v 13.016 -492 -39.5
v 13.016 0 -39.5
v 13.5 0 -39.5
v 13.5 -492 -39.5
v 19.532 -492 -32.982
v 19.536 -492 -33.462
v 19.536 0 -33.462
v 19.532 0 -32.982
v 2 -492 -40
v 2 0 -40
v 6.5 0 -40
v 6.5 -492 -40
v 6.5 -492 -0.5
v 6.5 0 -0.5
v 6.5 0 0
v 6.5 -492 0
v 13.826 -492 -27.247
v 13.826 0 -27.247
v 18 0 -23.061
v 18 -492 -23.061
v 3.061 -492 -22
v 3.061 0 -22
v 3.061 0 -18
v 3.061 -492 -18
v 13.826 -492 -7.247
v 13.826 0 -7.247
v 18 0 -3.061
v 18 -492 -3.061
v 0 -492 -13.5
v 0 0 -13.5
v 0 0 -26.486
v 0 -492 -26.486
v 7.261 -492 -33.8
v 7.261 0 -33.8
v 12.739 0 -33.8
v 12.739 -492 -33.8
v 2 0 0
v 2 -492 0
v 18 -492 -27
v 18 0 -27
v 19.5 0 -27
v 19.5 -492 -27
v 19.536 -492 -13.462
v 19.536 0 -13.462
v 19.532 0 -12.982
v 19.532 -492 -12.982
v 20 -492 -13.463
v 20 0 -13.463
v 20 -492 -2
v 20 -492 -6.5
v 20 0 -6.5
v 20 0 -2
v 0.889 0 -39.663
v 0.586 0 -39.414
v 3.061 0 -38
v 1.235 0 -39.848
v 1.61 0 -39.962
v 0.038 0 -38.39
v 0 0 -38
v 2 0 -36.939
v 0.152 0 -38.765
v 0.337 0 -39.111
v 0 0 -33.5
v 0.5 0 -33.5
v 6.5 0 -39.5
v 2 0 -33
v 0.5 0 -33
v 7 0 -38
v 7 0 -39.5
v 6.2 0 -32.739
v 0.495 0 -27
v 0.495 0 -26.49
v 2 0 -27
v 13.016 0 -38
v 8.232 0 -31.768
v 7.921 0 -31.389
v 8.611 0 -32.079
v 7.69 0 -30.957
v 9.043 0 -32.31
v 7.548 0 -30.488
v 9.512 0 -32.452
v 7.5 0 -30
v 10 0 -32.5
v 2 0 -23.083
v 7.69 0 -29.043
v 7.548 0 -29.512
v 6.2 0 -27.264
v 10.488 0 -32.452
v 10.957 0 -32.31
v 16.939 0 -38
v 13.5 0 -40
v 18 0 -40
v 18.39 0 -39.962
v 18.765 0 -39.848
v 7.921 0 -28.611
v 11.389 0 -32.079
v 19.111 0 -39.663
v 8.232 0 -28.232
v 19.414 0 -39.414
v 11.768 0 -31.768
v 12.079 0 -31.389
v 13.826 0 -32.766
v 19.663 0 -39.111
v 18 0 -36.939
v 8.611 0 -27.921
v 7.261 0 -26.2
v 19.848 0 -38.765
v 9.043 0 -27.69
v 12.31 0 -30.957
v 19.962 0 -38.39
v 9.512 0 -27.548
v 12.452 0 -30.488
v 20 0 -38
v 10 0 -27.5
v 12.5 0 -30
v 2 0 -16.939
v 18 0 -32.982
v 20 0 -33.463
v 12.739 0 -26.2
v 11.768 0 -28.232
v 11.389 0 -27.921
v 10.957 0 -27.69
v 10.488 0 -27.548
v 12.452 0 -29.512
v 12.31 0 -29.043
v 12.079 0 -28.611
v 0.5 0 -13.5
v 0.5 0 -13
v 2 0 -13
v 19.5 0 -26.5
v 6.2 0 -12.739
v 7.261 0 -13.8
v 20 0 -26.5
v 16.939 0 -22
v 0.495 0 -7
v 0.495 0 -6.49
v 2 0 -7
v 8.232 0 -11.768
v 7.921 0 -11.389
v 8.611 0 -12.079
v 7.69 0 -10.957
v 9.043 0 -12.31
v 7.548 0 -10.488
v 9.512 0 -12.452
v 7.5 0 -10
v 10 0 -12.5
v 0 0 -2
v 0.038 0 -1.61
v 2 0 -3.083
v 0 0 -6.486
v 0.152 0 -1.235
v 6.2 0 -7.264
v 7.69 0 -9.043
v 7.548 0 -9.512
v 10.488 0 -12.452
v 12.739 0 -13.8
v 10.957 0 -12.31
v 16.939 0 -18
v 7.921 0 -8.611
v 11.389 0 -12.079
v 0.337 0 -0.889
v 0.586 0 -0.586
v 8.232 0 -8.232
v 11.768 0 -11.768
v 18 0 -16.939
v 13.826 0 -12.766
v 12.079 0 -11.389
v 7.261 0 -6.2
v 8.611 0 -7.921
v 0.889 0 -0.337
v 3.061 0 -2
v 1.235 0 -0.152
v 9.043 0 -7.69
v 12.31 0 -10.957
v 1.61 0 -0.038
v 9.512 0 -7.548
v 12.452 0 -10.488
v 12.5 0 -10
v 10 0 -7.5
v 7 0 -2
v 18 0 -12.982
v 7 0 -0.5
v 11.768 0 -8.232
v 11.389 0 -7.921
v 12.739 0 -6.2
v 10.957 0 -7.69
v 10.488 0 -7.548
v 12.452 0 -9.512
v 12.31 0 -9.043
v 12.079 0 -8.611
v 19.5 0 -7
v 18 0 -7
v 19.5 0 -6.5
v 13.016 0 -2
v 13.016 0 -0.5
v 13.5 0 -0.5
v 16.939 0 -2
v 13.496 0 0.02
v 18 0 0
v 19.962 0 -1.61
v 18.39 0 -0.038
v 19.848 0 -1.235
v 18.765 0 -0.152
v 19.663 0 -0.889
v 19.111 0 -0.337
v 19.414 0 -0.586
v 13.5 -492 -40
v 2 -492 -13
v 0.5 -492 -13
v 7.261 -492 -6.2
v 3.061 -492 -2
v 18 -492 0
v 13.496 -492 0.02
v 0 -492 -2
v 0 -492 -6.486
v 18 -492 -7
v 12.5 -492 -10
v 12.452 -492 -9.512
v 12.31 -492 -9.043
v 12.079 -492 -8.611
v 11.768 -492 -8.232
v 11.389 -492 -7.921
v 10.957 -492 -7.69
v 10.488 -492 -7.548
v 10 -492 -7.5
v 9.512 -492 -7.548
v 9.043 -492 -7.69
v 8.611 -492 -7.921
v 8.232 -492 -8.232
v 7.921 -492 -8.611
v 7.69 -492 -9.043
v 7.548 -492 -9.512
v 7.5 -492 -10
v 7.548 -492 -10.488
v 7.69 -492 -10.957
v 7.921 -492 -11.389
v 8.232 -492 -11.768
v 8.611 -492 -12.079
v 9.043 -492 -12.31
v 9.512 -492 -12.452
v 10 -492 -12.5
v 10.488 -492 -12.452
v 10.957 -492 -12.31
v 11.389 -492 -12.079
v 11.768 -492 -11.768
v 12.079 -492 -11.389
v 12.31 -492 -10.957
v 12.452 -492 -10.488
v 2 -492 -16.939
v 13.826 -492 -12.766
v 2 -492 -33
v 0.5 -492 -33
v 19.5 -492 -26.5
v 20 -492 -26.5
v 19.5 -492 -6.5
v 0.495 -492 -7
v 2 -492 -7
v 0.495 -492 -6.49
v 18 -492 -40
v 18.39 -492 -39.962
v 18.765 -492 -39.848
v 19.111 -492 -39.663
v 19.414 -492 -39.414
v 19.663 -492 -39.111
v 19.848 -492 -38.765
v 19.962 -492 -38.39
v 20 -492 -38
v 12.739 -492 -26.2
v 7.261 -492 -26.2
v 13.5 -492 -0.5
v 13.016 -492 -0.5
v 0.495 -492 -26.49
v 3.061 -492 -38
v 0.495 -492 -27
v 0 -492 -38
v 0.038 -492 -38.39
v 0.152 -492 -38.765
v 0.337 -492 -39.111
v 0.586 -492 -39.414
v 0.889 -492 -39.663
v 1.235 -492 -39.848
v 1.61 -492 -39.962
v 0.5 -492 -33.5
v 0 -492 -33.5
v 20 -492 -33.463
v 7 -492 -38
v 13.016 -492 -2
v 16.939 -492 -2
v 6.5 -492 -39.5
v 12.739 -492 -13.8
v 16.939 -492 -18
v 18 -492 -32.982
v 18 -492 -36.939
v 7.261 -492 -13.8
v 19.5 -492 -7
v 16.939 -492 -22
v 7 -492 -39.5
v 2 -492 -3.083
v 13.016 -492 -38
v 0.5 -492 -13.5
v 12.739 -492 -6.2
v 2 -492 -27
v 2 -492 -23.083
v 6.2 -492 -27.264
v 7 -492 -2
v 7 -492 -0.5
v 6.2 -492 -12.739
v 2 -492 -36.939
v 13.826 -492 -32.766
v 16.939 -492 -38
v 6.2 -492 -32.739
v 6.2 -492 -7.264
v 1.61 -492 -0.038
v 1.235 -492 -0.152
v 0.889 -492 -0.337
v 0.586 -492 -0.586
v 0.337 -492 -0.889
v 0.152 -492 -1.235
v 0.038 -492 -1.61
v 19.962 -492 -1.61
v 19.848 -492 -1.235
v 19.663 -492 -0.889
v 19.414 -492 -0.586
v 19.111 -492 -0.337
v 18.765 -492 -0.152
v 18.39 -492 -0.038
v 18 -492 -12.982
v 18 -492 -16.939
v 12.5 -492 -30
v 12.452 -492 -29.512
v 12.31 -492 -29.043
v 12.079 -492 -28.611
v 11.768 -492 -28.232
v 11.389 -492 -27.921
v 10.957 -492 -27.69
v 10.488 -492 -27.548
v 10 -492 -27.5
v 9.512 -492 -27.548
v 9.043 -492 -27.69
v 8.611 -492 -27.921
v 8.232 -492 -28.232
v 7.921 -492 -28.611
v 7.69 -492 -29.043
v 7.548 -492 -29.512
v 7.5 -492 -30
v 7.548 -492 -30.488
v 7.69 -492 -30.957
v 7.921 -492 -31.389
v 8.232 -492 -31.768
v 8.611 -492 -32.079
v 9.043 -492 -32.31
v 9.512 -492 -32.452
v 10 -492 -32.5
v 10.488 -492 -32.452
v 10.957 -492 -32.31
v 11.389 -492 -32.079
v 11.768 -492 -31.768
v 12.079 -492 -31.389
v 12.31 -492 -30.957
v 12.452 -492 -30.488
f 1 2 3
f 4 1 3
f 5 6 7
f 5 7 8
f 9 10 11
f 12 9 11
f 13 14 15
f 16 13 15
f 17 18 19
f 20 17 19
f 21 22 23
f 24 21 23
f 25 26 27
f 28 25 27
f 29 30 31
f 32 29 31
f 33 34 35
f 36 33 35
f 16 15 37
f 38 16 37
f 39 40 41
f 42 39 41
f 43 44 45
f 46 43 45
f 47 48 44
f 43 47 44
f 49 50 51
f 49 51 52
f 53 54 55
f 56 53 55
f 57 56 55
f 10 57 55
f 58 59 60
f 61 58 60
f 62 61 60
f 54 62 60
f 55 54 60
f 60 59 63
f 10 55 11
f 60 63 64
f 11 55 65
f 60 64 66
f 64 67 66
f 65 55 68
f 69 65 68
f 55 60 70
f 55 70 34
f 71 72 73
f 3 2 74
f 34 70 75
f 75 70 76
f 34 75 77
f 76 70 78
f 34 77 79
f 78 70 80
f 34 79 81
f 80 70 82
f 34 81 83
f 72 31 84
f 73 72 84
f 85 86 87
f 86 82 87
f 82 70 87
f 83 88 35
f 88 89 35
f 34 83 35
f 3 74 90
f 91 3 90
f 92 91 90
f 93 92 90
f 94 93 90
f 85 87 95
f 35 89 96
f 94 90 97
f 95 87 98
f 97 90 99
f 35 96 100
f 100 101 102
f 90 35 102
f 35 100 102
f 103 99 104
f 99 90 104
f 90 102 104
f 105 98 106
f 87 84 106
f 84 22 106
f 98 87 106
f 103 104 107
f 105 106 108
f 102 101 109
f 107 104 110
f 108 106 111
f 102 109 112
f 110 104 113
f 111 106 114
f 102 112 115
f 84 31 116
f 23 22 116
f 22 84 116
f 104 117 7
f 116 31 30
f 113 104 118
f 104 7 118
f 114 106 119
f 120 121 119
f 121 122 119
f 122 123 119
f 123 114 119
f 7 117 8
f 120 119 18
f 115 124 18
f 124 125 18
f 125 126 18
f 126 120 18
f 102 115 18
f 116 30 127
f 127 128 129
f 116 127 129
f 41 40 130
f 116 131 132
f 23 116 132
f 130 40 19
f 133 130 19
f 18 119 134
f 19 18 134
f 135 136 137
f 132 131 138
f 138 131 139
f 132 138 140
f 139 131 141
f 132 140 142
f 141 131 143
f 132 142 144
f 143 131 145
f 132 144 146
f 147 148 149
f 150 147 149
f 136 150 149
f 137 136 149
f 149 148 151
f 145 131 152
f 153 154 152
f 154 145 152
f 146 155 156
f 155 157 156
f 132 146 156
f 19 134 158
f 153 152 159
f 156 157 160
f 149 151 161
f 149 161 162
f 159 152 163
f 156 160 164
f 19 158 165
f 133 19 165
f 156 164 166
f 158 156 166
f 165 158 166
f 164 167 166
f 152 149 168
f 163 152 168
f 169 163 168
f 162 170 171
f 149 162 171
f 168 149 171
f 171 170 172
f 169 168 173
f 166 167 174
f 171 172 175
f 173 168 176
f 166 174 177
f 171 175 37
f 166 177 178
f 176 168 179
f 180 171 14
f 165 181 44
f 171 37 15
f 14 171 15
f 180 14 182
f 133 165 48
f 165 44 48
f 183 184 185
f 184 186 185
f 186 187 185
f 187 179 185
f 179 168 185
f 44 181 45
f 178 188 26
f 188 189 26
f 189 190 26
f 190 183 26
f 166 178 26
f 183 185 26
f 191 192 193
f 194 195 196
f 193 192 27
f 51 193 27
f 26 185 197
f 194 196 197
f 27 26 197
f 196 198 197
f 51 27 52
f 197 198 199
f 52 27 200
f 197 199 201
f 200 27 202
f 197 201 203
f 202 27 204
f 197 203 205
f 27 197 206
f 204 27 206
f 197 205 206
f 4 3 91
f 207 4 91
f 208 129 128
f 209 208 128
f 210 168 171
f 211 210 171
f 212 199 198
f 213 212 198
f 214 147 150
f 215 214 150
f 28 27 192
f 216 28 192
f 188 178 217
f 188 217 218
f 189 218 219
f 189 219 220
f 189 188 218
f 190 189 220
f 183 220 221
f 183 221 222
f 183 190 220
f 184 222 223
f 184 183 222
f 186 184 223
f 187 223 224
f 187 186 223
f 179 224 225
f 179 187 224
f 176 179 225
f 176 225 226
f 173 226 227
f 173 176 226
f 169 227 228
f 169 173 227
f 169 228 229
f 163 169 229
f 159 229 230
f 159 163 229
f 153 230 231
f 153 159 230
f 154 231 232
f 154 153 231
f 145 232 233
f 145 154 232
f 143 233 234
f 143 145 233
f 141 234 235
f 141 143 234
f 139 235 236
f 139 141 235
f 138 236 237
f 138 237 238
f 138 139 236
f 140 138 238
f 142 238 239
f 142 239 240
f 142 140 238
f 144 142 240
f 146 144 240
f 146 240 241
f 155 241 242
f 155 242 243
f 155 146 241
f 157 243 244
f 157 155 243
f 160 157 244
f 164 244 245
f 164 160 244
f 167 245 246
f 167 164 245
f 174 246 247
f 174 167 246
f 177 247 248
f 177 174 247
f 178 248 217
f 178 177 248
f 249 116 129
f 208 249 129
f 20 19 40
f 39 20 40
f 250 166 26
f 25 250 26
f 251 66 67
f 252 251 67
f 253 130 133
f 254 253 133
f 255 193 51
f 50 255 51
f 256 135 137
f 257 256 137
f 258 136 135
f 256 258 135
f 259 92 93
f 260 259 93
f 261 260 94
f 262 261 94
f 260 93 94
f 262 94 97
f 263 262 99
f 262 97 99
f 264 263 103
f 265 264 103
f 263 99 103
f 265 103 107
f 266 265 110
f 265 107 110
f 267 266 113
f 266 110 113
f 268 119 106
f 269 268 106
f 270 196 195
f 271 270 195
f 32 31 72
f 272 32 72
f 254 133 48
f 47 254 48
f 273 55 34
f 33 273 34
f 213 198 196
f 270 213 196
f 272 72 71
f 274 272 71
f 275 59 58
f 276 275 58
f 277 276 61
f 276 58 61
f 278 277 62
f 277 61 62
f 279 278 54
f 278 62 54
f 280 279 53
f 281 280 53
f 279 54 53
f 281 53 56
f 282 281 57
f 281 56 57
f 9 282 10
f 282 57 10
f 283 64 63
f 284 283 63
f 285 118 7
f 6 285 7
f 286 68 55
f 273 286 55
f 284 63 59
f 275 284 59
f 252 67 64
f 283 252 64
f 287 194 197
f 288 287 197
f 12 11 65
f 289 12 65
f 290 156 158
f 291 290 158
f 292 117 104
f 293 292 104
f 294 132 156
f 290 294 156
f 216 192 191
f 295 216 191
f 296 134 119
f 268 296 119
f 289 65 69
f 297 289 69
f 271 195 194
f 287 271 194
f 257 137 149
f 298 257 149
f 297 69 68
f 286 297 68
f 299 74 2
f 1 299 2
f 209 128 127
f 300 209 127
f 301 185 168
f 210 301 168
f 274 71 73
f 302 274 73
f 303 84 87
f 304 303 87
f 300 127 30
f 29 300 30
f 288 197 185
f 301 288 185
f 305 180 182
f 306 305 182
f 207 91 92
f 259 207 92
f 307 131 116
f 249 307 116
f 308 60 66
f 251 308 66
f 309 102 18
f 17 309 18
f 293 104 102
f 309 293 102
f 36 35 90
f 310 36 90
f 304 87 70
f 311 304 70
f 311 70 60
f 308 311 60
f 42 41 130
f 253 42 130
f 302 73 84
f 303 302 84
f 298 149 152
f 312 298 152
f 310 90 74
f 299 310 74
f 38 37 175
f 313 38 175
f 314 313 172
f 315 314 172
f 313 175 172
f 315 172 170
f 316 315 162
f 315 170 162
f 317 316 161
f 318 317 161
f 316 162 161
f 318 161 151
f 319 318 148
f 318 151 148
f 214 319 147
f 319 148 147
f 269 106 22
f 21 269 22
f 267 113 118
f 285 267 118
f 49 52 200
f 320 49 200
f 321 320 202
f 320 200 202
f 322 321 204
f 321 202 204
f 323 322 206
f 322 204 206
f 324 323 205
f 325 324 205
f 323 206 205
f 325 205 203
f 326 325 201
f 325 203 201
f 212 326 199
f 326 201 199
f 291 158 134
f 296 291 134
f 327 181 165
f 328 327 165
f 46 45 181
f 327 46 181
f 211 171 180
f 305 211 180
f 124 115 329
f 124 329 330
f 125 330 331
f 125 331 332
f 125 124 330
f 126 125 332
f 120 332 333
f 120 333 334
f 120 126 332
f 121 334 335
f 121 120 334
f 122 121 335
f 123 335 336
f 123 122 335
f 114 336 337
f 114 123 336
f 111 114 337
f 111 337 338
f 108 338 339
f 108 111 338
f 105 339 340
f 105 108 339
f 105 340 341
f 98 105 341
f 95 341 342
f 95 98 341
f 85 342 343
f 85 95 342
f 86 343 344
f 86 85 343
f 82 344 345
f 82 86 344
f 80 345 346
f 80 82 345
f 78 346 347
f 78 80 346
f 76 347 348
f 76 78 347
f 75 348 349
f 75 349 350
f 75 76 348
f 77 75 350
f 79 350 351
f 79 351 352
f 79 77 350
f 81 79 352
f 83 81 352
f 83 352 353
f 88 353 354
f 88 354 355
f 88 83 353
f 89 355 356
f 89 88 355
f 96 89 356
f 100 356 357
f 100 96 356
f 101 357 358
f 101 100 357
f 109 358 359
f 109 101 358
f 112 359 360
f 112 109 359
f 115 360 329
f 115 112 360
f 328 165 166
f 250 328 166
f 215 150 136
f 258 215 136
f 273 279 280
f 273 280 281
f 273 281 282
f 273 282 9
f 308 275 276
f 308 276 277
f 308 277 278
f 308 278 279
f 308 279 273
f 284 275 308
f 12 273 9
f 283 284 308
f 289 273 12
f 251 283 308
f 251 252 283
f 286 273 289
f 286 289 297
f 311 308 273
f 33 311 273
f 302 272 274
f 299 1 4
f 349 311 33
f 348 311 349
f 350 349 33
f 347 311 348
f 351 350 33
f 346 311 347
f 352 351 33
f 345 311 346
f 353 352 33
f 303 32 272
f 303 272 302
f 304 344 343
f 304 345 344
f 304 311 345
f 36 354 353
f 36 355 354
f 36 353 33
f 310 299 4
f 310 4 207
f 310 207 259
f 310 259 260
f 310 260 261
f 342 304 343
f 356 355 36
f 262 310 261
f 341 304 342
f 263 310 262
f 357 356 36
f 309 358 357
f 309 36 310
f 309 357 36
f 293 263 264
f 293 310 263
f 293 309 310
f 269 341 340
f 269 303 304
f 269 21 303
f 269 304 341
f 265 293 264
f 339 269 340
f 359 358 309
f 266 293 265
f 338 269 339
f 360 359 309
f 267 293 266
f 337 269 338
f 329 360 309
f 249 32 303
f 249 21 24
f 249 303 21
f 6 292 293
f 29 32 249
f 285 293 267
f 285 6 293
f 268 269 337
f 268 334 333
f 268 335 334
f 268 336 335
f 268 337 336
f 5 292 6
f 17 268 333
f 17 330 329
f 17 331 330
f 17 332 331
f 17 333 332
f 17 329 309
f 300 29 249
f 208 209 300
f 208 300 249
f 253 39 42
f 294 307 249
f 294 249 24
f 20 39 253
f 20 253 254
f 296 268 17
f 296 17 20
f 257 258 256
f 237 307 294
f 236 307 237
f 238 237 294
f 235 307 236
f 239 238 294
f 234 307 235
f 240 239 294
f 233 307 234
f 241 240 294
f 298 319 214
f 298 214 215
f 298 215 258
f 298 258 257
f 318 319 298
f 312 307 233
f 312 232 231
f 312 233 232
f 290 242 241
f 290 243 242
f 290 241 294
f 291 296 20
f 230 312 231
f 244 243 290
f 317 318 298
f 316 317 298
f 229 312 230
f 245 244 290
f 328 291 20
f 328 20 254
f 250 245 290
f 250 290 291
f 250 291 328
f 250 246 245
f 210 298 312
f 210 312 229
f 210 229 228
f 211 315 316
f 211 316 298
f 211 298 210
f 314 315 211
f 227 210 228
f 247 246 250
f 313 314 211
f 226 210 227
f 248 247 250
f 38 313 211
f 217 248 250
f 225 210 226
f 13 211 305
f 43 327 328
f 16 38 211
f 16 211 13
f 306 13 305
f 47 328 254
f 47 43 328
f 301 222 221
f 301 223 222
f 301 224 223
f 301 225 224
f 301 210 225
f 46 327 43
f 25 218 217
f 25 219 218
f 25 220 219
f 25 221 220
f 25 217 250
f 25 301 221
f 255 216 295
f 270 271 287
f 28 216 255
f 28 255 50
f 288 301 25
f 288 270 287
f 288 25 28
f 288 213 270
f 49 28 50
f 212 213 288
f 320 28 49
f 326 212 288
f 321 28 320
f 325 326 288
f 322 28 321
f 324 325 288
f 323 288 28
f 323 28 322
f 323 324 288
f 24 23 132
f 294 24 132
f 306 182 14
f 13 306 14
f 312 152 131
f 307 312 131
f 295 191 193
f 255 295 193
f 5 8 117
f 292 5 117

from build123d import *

# Parameters (mm, degrees)
F0_R     = 2.5
F2_DEPTH = 492


with BuildPart() as f2:
    # F0 (on Front) → F2 (new body)
    with BuildSketch(Plane.XZ):
        with BuildLine():
            Line((6.5, 0), (2, 0))
            ThreePointArc((2, 0), (0.5857864376, -0.5857864376), (0, -2))
            Line((0, -2), (0, -6.4857100192))
            Line((0, -6.4857100192), (0.4948230833, -6.489995392))
            Line((0.4948230833, -6.489995392), (0.4948230833, -7))
            Line((0.4948230833, -7), (2, -7))
            Line((2, -7), (2, -3.0833937817))
            Line((2, -3.0833937817), (6.2, -7.2637052917))
            Line((6.2, -7.2637052917), (6.2, -12.7393398282))
            Line((6.2, -12.7393398282), (2, -16.9393398282))
            Line((2, -16.9393398282), (2, -13))
            Line((2, -13), (0.5, -13))
            Line((0.5, -13), (0.5, -13.5))
            Line((0.5, -13.5), (0, -13.5))
            Line((0, -13.5), (0, -26.4857100192))
            Line((0, -26.4857100192), (0.4948230833, -26.489995392))
            Line((0.4948230833, -26.489995392), (0.4948230833, -27))
            Line((0.4948230833, -27), (2, -27))
            Line((2, -27), (2, -23.0833937817))
            Line((2, -23.0833937817), (6.2, -27.2637052917))
            Line((6.2, -27.2637052917), (6.2, -32.7393398282))
            Line((6.2, -32.7393398282), (2, -36.9393398282))
            Line((2, -36.9393398282), (2, -33))
            Line((2, -33), (0.5, -33))
            Line((0.5, -33), (0.5, -33.5))
            Line((0.5, -33.5), (0, -33.5))
            Line((0, -33.5), (0, -38))
            ThreePointArc((0, -38), (0.5857864376, -39.4142135624), (2, -40))
            Line((2, -40), (6.5, -40))
            Line((6.5, -40), (6.5, -39.5))
            Line((6.5, -39.5), (7, -39.5))
            Line((7, -39.5), (7, -38))
            Line((7, -38), (3.0606601718, -38))
            Line((3.0606601718, -38), (7.2606601718, -33.8))
            Line((7.2606601718, -33.8), (12.7393398282, -33.8))
            Line((12.7393398282, -33.8), (16.9393398282, -38))
            Line((16.9393398282, -38), (13.015800612, -38))
            Line((13.015800612, -38), (13.015800612, -39.5))
            Line((13.015800612, -39.5), (13.5, -39.5))
            Line((13.5, -39.5), (13.5, -40))
            Line((13.5, -40), (18, -40))
            ThreePointArc((18, -40), (19.4142135624, -39.4142135624), (20, -38))
            Line((20, -38), (20, -33.4626608249))
            Line((20, -33.4626608249), (19.5363645284, -33.4624647606))
            Line((19.5363645284, -33.4624647606), (19.532302618, -32.9822008219))
            Line((19.532302618, -32.9822008219), (18, -32.9822008219))
            Line((18, -32.9822008219), (17.9998106987, -36.9393398192))
            Line((17.9998106987, -36.9393398192), (13.8264202785, -32.765949399))
            Line((13.8264202785, -32.765949399), (13.8264202785, -27.246708479))
            Line((13.8264202785, -27.246708479), (17.9998106987, -23.0606601627))
            Line((17.9998106987, -23.0606601627), (17.9998106987, -26.9999999909))
            Line((17.9998106987, -26.9999999909), (19.4998106987, -26.9999999909))
            Line((19.4998106987, -26.9999999909), (19.4998106987, -26.4999999909))
            Line((19.4998106987, -26.4999999909), (20, -26.4999999909))
            Line((20, -26.4999999909), (20, -13.4626608249))
            Line((20, -13.4626608249), (19.5363645284, -13.4624647606))
            Line((19.5363645284, -13.4624647606), (19.532302618, -12.9822008219))
            Line((19.532302618, -12.9822008219), (18, -12.9822008219))
            Line((18, -12.9822008219), (17.9998106987, -16.9393398192))
            Line((17.9998106987, -16.9393398192), (13.8264202785, -12.765949399))
            Line((13.8264202785, -12.765949399), (13.8264202785, -7.246708479))
            Line((13.8264202785, -7.246708479), (17.9998106987, -3.0606601627))
            Line((17.9998106987, -3.0606601627), (17.9998106987, -6.9999999909))
            Line((17.9998106987, -6.9999999909), (19.4998106987, -6.9999999909))
            Line((19.4998106987, -6.9999999909), (19.4998106987, -6.4999999909))
            Line((19.4998106987, -6.4999999909), (20, -6.4999999909))
            Line((20, -6.4999999909), (20, -2))
            ThreePointArc((20, -2), (19.4142135624, -0.5857864376), (18, 0))
            Line((18, 0), (13.4962801728, 0.0202495232))
            Line((13.4962801728, 0.0202495232), (13.5, -0.5))
            Line((13.5, -0.5), (13.015800612, -0.5))
            Line((13.015800612, -0.5), (13.015800612, -2))
            Line((13.015800612, -2), (16.9393398282, -2))
            Line((16.9393398282, -2), (12.7393121854, -6.2000276428))
            Line((12.7393121854, -6.2000276428), (7.2606601718, -6.2))
            Line((7.2606601718, -6.2), (3.0606601718, -2))
            Line((3.0606601718, -2), (7, -2))
            Line((7, -2), (7, -0.5))
            Line((7, -0.5), (6.5, -0.5))
            Line((6.5, -0.5), (6.5, 0))
        make_face()
        with Locations((10, -30)):
            Circle(F0_R, mode=Mode.SUBTRACT)
        Polygon((7.2606601718, -13.8), (12.7393398282, -13.8), (16.9393398282, -18), (16.9393398282, -22), (12.7393121854, -26.2000276428), (7.2606601718, -26.2), (3.0606601718, -22), (3.0606601718, -18), align=None, mode=Mode.SUBTRACT)
        with Locations((10, -10)):
            Circle(F0_R, mode=Mode.SUBTRACT)
    extrude(amount=F2_DEPTH)


solid = f2.part
